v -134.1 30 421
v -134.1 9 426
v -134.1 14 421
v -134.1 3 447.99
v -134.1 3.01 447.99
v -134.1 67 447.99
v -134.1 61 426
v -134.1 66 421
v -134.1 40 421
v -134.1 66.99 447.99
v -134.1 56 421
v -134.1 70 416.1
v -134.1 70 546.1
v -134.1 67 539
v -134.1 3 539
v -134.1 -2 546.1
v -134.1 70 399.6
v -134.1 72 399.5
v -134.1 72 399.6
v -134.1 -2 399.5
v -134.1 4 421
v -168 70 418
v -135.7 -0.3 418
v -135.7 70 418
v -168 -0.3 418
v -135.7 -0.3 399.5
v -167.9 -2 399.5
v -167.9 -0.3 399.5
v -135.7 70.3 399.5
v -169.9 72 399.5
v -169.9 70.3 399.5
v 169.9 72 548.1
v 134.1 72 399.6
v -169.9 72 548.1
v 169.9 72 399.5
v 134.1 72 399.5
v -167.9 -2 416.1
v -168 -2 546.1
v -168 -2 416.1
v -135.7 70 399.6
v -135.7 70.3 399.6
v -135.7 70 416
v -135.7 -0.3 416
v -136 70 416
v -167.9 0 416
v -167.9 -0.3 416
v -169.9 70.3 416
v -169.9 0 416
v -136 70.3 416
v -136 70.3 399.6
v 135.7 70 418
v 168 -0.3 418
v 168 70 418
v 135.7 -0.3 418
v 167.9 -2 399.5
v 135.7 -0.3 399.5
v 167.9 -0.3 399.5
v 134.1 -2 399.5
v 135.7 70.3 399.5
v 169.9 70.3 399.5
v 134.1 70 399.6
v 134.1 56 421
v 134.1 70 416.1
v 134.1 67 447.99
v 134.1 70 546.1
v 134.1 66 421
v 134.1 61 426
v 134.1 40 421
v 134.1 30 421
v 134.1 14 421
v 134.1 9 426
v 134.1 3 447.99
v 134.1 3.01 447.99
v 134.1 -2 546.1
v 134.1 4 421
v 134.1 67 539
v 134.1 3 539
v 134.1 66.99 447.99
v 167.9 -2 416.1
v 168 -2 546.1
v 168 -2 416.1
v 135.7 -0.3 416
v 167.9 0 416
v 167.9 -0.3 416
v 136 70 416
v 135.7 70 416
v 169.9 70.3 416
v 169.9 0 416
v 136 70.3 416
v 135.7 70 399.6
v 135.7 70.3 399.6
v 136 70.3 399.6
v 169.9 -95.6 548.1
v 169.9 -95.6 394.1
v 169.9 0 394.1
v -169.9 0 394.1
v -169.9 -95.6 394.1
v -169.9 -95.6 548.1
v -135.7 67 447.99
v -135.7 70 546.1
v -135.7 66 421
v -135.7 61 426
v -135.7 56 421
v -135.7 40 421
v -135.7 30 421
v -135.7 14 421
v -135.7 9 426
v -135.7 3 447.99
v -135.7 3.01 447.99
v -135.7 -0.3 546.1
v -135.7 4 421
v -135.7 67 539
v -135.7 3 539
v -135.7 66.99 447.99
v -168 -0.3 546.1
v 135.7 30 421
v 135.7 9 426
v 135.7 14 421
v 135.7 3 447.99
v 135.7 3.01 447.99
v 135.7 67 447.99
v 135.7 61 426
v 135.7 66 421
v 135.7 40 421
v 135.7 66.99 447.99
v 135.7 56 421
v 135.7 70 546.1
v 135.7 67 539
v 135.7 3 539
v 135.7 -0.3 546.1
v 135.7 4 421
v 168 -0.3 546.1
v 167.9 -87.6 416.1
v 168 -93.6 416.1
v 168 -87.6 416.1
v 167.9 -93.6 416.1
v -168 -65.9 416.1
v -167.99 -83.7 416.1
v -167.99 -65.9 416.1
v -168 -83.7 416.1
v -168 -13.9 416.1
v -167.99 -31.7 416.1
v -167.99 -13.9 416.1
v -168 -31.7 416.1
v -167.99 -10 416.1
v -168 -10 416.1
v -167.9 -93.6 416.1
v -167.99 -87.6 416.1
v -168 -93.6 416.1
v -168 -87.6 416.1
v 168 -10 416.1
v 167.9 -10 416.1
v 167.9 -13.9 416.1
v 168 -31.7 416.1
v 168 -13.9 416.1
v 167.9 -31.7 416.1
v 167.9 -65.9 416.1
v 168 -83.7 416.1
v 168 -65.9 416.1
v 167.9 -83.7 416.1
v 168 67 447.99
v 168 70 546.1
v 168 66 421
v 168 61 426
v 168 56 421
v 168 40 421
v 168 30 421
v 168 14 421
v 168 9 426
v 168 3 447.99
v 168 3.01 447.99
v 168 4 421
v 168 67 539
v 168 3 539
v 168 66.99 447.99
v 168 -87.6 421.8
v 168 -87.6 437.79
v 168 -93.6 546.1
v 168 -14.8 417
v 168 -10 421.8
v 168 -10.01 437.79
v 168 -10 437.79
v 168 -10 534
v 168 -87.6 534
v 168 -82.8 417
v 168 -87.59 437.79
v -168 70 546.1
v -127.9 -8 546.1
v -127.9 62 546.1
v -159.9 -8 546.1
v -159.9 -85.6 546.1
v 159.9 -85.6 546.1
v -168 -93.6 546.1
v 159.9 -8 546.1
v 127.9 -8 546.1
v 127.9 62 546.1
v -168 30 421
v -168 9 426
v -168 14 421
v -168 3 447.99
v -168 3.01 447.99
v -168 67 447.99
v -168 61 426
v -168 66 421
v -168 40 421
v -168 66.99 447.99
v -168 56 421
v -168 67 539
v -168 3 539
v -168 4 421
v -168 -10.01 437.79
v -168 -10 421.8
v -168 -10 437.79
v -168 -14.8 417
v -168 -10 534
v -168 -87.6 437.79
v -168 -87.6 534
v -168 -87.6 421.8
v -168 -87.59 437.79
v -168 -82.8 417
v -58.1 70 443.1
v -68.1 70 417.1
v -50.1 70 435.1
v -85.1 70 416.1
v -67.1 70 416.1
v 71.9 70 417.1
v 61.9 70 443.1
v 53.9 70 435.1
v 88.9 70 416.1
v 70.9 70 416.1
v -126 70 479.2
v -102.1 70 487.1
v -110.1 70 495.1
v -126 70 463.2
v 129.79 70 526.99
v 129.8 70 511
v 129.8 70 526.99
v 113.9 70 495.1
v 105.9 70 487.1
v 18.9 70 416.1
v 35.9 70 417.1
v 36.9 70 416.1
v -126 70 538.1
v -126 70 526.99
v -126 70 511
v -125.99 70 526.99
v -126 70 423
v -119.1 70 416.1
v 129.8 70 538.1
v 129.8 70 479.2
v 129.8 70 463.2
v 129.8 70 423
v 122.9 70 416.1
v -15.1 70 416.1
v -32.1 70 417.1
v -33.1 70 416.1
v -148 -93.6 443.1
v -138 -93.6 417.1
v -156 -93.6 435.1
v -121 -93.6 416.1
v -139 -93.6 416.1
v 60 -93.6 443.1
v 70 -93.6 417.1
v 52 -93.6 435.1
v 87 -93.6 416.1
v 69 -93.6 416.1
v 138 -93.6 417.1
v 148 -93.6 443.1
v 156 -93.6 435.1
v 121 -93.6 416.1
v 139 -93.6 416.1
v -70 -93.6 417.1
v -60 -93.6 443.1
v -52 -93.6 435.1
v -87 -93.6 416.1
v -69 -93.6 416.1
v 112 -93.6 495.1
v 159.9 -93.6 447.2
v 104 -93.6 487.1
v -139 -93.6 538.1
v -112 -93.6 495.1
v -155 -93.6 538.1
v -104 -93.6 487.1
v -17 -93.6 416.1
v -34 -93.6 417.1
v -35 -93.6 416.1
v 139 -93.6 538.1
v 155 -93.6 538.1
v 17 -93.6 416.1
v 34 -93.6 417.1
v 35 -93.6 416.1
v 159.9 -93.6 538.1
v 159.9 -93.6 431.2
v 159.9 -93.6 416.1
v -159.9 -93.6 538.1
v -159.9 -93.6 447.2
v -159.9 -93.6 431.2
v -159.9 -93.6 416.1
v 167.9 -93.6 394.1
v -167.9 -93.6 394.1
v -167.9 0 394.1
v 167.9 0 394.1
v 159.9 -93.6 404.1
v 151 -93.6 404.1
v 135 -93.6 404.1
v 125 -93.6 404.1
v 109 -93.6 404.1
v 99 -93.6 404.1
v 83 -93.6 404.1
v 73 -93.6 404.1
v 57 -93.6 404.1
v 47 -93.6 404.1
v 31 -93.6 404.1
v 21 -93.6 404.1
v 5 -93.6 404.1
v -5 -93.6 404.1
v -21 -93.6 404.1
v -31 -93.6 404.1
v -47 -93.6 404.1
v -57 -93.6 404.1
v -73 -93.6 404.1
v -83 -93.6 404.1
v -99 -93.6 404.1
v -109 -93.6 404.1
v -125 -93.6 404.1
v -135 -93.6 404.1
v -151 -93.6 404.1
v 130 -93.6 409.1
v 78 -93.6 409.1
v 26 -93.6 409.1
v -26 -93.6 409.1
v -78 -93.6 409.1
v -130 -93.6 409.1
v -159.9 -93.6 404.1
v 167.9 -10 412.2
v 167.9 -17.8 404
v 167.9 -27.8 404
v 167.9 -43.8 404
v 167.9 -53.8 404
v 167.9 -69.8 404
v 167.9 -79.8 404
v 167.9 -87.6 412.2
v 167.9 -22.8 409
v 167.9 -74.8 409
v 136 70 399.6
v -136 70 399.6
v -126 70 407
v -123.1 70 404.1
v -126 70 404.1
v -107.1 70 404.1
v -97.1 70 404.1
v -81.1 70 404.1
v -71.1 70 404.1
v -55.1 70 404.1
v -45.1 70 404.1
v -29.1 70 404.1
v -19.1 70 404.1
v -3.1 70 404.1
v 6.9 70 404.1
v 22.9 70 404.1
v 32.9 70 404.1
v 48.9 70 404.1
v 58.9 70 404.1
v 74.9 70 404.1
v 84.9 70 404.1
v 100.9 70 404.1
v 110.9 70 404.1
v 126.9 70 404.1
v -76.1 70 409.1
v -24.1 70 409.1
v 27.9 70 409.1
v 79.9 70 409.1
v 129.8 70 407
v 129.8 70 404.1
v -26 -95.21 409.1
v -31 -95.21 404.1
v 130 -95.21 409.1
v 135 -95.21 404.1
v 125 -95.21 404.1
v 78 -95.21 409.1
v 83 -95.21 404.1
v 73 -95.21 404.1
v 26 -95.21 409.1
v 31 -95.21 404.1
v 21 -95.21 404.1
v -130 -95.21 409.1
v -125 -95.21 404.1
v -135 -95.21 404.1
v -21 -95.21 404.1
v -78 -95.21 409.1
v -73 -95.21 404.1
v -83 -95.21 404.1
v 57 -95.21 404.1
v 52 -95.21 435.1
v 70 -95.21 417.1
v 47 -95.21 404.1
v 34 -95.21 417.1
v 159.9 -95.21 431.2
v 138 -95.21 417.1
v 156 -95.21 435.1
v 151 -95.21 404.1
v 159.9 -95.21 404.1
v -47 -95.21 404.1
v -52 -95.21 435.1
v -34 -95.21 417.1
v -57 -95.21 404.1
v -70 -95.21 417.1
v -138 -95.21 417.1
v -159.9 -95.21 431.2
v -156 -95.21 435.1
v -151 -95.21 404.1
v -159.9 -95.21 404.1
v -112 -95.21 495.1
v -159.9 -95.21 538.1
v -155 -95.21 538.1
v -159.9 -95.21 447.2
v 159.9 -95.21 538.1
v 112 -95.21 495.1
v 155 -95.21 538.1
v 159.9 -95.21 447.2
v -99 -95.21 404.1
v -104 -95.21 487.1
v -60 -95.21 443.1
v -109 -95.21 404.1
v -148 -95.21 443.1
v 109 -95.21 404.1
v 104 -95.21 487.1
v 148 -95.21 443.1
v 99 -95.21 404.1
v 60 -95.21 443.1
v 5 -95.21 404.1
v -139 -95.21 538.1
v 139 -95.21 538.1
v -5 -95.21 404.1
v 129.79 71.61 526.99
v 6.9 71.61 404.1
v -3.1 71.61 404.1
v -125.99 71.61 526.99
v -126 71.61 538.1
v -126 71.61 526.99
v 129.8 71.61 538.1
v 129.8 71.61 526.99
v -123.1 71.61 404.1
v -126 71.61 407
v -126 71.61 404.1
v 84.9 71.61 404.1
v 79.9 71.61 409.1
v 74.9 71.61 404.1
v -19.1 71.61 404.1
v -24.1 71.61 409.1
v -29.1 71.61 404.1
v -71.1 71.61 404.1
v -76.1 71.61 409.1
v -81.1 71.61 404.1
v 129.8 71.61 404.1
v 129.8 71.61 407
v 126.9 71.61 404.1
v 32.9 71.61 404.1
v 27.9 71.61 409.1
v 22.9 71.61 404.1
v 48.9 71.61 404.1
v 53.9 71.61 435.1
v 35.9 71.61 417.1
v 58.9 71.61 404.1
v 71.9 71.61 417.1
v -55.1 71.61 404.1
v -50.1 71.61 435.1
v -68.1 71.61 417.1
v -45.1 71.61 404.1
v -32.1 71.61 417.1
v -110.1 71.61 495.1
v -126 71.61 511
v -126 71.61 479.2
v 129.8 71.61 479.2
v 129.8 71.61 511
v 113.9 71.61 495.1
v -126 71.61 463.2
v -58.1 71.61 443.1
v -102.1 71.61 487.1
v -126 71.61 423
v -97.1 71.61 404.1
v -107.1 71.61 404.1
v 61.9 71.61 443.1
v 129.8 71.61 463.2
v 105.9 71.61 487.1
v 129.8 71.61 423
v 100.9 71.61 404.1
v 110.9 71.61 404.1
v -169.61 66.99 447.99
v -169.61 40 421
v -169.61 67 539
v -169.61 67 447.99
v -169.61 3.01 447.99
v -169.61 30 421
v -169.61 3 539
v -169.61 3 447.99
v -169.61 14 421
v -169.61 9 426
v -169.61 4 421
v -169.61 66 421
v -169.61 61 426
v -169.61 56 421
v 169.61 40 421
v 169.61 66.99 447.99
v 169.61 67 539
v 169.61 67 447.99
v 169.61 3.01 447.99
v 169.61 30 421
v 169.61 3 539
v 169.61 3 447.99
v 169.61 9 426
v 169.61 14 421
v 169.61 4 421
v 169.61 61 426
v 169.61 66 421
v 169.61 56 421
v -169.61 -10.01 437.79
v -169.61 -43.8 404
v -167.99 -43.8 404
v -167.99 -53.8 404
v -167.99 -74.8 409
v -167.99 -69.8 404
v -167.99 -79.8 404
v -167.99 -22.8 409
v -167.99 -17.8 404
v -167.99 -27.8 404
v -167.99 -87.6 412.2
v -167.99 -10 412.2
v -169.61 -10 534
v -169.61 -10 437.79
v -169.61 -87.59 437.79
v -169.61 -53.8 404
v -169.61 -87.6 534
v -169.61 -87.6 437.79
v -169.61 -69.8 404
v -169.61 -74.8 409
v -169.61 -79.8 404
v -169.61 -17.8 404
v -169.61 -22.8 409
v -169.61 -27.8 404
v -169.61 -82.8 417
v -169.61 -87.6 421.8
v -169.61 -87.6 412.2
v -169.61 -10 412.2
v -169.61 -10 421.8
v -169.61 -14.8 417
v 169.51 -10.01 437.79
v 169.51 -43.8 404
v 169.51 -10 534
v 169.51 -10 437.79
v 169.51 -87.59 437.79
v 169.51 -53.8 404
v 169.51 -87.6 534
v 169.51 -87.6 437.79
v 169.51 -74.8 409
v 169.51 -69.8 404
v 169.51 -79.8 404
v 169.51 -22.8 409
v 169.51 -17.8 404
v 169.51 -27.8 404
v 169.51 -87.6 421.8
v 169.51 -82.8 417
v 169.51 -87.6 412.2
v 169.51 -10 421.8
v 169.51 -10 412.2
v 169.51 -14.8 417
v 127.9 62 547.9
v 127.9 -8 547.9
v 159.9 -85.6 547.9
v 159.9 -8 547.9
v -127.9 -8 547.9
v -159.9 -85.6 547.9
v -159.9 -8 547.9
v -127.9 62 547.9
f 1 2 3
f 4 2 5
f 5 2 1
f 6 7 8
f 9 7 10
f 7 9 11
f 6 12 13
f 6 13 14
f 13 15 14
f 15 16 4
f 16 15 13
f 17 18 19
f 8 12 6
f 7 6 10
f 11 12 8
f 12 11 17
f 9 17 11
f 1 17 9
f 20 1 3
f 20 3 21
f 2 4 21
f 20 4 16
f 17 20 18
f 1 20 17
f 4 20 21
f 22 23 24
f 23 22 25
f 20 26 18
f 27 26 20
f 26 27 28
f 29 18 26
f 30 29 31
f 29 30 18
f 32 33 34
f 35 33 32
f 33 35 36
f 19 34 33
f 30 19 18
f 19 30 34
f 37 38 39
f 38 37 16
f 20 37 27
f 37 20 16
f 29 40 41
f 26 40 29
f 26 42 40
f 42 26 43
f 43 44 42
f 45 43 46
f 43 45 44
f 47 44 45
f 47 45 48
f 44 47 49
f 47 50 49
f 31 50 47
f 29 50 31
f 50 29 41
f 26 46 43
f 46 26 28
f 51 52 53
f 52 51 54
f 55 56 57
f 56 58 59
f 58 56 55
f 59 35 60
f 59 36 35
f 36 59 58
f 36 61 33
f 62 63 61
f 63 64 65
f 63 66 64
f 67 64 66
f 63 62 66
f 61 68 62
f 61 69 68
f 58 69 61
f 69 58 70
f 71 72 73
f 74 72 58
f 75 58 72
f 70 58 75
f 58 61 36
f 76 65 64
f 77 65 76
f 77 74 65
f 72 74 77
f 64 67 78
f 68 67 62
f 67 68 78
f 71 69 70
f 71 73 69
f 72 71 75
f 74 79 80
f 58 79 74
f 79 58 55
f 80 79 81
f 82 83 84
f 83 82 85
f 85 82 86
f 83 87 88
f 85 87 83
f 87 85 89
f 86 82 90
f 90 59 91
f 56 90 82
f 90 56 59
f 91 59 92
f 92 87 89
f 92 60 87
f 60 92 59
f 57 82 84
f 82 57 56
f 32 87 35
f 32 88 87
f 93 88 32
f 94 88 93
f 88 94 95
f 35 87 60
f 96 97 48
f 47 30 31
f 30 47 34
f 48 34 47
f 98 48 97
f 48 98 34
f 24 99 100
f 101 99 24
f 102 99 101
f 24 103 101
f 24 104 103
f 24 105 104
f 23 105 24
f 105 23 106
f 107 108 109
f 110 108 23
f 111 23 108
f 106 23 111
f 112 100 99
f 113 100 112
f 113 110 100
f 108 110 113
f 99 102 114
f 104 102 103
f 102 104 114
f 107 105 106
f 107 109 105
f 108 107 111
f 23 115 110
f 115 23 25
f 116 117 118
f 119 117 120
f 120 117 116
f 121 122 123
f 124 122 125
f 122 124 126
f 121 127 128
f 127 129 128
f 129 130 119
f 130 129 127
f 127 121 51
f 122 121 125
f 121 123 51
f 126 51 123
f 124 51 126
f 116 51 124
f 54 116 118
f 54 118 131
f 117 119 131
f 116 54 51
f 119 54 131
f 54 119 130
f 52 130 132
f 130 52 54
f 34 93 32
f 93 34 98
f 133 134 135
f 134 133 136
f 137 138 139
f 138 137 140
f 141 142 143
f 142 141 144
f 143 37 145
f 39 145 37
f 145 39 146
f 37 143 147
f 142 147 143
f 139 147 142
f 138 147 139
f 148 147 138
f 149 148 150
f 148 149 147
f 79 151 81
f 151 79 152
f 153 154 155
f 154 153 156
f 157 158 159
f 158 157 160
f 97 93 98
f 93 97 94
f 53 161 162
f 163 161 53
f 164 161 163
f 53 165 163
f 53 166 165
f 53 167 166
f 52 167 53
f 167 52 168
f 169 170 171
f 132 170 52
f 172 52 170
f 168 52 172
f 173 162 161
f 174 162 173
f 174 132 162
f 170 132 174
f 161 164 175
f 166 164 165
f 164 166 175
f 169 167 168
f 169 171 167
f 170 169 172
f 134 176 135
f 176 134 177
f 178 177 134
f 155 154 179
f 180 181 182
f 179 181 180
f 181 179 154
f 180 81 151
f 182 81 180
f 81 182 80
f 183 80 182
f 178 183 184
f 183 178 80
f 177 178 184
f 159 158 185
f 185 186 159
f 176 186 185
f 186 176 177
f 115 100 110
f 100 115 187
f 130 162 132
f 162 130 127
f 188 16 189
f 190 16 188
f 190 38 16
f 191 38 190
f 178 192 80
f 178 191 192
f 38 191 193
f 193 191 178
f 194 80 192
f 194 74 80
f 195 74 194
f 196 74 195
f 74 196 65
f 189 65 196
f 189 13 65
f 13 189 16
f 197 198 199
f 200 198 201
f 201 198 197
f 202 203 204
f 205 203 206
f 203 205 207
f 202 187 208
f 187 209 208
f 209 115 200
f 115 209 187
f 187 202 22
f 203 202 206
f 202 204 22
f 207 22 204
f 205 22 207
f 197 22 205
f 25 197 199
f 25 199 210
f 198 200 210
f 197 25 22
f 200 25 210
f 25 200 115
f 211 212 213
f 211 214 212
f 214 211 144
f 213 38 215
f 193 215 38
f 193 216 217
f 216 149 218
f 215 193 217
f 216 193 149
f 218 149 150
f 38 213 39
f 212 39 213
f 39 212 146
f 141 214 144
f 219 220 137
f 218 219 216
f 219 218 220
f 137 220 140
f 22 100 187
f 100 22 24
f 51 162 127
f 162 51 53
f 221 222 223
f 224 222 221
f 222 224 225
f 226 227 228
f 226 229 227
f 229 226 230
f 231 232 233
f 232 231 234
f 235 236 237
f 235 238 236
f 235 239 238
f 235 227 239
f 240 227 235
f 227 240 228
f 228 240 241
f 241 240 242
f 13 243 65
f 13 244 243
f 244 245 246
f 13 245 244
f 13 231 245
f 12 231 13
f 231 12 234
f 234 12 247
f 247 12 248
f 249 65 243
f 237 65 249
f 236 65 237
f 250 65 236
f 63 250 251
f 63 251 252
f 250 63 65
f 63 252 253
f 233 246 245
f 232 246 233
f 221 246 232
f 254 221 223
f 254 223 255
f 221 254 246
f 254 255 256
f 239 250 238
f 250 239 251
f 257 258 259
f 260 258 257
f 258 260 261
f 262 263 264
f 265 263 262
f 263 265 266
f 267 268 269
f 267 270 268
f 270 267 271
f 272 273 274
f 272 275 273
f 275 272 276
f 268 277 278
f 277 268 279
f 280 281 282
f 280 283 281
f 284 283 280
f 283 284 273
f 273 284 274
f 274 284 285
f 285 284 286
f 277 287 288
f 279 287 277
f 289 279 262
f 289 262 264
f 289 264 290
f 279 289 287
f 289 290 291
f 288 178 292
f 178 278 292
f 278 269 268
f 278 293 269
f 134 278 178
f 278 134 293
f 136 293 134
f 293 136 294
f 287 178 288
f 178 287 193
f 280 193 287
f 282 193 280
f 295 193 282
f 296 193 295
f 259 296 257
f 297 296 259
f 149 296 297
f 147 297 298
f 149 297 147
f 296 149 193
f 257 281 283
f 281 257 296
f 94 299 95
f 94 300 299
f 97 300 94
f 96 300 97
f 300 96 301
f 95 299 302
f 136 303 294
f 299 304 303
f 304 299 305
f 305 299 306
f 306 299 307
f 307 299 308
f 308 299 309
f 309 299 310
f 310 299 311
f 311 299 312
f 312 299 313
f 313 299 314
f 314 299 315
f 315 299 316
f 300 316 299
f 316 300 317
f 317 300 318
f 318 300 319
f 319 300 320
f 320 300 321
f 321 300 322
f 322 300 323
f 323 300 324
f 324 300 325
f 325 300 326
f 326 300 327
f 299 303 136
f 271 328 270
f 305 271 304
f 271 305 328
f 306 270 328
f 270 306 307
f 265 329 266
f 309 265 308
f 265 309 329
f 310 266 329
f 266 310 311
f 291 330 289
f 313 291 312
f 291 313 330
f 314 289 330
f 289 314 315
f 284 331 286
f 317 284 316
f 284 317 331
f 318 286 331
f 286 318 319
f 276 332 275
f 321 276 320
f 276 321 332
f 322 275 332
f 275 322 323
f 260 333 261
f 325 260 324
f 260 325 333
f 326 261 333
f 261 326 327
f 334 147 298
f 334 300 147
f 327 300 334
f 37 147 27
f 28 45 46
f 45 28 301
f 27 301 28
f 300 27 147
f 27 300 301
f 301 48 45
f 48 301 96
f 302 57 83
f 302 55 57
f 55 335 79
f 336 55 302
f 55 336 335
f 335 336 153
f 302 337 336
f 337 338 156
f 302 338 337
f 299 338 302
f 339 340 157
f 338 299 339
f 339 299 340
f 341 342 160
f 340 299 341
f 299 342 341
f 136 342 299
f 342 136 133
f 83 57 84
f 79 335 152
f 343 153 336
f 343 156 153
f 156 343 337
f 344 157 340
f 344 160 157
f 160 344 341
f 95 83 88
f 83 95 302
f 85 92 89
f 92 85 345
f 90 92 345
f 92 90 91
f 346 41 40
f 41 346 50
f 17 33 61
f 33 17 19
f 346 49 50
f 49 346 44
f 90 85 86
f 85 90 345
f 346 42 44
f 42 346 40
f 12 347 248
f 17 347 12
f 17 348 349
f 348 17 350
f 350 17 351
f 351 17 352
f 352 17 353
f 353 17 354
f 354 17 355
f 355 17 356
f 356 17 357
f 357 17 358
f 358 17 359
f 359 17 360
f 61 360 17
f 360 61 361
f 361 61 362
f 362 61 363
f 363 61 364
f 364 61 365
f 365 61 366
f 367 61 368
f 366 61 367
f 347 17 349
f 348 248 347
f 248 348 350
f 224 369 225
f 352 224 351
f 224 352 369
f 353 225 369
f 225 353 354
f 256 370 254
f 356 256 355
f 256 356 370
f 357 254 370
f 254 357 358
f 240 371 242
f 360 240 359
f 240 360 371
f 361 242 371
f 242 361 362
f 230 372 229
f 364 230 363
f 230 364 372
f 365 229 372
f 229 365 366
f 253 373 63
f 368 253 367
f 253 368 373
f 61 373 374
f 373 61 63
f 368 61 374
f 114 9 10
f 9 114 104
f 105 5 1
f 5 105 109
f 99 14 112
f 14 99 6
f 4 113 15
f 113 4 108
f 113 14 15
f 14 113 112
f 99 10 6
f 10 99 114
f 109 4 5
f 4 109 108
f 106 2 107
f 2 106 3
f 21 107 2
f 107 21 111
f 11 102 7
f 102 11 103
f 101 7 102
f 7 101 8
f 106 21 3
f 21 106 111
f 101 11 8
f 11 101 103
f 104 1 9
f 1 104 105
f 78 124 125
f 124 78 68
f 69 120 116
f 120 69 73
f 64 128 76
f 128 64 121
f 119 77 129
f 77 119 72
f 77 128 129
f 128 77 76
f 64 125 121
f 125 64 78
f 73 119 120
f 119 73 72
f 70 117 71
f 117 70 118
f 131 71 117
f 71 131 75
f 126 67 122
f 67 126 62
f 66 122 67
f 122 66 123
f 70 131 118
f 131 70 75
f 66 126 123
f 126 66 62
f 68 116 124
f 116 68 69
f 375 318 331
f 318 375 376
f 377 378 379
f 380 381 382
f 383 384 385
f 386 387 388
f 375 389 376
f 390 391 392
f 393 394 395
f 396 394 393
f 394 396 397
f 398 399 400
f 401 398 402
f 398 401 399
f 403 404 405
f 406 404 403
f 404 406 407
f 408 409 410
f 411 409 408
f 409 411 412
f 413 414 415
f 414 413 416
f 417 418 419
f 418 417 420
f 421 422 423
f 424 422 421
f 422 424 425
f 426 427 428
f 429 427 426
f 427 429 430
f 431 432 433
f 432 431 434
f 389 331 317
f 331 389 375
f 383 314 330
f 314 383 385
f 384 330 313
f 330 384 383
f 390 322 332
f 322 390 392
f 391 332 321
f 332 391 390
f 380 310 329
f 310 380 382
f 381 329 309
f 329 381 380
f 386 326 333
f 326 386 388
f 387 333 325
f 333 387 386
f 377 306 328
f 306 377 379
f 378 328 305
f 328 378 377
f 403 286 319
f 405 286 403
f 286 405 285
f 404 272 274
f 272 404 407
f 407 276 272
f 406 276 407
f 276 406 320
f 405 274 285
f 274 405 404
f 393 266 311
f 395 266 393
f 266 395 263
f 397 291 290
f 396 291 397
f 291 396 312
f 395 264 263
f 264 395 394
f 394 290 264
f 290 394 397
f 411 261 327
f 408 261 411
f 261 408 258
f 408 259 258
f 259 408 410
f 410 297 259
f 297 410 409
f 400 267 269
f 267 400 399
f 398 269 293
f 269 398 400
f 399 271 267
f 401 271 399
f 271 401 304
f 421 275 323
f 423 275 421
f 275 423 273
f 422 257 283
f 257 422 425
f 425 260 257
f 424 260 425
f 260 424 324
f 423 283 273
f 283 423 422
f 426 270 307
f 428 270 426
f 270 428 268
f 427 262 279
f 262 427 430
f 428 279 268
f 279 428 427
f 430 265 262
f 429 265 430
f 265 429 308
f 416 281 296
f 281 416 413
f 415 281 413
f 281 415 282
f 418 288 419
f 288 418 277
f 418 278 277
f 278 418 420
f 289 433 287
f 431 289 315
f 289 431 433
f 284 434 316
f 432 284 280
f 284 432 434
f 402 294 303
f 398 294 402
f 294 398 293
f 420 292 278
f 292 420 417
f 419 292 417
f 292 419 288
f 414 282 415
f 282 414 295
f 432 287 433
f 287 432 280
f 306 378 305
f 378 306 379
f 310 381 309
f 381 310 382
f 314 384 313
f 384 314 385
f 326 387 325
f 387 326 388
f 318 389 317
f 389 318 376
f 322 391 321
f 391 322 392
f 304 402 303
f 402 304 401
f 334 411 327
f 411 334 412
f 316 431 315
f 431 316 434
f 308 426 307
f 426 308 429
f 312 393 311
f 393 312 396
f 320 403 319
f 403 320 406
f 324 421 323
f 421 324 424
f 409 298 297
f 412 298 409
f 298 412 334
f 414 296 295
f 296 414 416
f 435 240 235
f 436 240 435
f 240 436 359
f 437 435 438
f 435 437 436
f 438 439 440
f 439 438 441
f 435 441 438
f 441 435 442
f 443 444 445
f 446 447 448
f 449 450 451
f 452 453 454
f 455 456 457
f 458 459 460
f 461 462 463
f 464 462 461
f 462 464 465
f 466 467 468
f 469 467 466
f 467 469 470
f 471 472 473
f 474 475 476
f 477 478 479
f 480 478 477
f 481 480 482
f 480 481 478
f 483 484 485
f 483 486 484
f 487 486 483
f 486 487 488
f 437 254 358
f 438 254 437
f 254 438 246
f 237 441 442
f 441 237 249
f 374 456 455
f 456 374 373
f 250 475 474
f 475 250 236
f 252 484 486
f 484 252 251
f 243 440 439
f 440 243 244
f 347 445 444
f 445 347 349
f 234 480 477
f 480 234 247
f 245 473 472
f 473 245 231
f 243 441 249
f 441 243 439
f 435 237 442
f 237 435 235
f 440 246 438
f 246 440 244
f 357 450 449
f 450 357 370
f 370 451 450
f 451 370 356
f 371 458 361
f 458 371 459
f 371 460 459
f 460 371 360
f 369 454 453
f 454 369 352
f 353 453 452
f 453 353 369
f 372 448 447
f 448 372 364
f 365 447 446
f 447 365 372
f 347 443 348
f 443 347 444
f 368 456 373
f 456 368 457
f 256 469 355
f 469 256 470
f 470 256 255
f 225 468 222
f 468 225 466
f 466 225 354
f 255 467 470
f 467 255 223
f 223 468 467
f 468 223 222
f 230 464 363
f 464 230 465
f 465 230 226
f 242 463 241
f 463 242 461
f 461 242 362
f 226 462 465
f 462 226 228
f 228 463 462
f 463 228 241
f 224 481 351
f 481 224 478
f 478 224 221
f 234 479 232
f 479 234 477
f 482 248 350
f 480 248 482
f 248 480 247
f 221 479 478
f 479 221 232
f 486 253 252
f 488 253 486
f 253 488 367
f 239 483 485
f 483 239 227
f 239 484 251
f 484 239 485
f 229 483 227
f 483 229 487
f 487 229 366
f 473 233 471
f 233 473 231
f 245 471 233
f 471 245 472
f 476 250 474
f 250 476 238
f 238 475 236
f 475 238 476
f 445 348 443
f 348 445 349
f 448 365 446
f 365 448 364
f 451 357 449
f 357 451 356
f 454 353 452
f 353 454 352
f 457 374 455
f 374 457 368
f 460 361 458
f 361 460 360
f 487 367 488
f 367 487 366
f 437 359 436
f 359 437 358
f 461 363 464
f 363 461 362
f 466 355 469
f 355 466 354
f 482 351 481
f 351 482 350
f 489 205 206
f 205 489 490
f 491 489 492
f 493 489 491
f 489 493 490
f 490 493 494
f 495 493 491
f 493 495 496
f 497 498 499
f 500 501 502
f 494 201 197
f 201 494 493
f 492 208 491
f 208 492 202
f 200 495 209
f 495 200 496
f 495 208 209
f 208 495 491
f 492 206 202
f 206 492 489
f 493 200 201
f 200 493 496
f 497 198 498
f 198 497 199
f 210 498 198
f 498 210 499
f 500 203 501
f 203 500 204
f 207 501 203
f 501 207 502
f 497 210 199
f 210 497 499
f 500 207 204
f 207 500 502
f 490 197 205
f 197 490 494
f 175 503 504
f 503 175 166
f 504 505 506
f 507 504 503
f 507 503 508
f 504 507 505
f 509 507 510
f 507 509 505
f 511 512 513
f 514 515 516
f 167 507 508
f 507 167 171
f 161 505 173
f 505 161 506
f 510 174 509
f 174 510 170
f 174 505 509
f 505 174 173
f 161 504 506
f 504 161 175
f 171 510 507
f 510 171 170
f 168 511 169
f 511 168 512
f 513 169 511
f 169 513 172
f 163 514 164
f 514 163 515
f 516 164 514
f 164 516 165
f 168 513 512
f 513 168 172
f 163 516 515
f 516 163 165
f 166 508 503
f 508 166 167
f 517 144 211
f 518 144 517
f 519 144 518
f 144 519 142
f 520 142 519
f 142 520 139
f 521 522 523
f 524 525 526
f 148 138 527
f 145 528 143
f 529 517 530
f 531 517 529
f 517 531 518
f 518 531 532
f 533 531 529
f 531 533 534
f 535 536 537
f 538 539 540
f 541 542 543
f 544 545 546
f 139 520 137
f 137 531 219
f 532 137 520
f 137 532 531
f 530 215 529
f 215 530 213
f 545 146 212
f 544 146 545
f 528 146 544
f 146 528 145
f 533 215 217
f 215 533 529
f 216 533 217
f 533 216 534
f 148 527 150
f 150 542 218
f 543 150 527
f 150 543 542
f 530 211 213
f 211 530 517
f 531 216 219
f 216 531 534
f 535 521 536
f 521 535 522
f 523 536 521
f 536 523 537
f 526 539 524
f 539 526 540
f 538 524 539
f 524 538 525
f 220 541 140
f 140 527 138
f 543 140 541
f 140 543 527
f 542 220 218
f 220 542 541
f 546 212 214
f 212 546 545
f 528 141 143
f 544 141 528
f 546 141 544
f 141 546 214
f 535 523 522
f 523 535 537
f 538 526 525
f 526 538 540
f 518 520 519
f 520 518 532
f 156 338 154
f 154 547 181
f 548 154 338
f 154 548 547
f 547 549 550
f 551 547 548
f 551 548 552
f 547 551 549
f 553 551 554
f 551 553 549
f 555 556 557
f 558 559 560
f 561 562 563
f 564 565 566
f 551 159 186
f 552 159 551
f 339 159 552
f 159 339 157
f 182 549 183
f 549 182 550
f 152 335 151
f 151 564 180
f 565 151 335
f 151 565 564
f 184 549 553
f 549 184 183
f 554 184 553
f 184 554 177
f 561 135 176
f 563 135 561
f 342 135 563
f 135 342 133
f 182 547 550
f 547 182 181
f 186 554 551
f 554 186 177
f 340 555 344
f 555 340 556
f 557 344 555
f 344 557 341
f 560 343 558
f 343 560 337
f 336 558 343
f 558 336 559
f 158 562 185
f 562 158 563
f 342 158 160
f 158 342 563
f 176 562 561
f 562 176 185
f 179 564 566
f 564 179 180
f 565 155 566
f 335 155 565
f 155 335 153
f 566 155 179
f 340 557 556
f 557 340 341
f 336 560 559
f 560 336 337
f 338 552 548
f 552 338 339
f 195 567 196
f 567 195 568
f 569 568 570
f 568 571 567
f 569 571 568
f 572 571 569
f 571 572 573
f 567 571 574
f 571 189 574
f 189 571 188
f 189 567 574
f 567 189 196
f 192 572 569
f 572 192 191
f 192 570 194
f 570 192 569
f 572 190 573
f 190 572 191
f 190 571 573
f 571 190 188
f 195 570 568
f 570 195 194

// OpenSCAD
// Copyright 2024 Heikki Suonsivu
// Licensed under Creative Commons CC-BY-NC-SA, see https://creativecommons.org/licenses/by-nc-sa/4.0/
// For commercial licensing, please contact directly, hsu-3d@suonsivu.net, +358 40 551 9679

// todo
// fingerclip
// 

include <hsu.scad>

print=1;

lightenthin=1; // Make various areas very thin to reduce printing time and material consumption.
lightenx=lightenthin?0.4:0;
lighteny=lightenthin?0.4:0;
lightenz=lightenthin?0.2:0;

lmargin=10;
lfill=8;

maxbridge=10;

b=800;

xtolerance=0.3;
ytolerance=0.3;
ztolerance=0.3;

maxy=240; // 250 really, but leave some space
wall=1.2; // Just wall to block airflow, no strength
mediumwall=2.0; // Thicker wall when structural strength may be needed

baseh=58; // Under z=0
baseheight=-baseh;
basew=426;
basel=434;
basey=-273;

towerh=416;//410;
towerw=64;
towerl=70;
towerdistance=272;
towerfreecap=16.5;
towerfreespaceabove=130;

maxh=394; // Only towers are higher than this
maxtotower=towerh-maxh;

topbarh=25.5;
topbarheight=towerh-18.8-topbarh; // measured 395 should be
echo(topbarheight);

topbarl=18.1; //19;
topbarfromtowerback=5.5;
topbary=towerl-topbarfromtowerback-topbarl;

topcoverh=150;
topcoverfrontl=160; // From back of towers
topcoverbackl=130; // From back of towers
topcoverfronty=towerl-topcoverfrontl;
topcoverbacky=towerl+topcoverbackl;
topcoverw=towerdistance+towerw;

backw=towerdistance+wall*2+2*9; // TARKISTA CORNER
backl=195-towerl;//190-towerl;
backbottomextension=15;
backmidflangew=2*mediumwall;
backmidflangel=8;
backflangew=5;
backflangel=wall;
backcornerfill=5;
backoverbase=towerl+backl-(basey+basel)+ytolerance-36;

spoolholderh=40;
spoolholderw=40;
spoolholderlength=244;
spoolholderl=8.3;
spoolholderheight=329;
spoolholderx=-towerdistance/2-towerw/2-spoolholderl/2+spoolholderw/2-spoolholderlength;

trayh=3.5;
lefttrayedgeh=45;
righttrayedgeh=25;

gantrymovement=305-55; // 333-85; //300; //250; // TARKISTA

//45 65
leftboxw=72;
leftboxl=65;
leftboxh=132;
leftboxx=-38-leftboxw-towerdistance/2; // TARKISTA
leftboxy=-49;//-leftboxl;

leftboxbottomheight=12;
leftboxtopheight=leftboxbottomheight+gantrymovement; // Including left box h

filamenty=42;
filamentd=10;
filamentw=1;
filamenttubed=4;
filamenttubew=10;
filamentheight=105;

rightboxw=81.5;//74;
rightboxl=94; // y size
rightboxh=128;
rightboxx=towerdistance/2+39;

cameray=14; // camera position y size (from back)
cameraw=10;
cameral=36;
camerah=45;
cameraheight=0; // TARKISTA relative to bottom of right box

rightboxbottomheight=12;
rightboxtopheight=rightboxbottomheight+gantrymovement;

rightboxy=-74;

printplateheight=25;
printplateh=5;
printplatew=250;
magnetplatetabl=17;
magnetplatetabw=153;
printplatel=250;
printplatefronty=-332+magnetplatetabl; // Print plate when in front position
printplatebacky=190-printplatel; // Print plate when in back position

gantryw=360;
gantryl=18.5;
gantryh=28.1;
gantrybottomheight=84.6-gantryh;
gantryy=-20.6;
gantrytopheight=gantrybottomheight+gantrymovement;

printheadw=97.5;
printheadl=65;
printheadh=101.5; // Including nozzle
printheadleftx=-35.5-towerdistance/2; // TARKISTA
printheadrightx=towerdistance/2-70.8;
printheady=gantryy-printheadl;
printheadbottomheight=printplateheight+printplateh;
printheadtopheight=printheadbottomheight+gantrymovement;

midcovery=printheady-10;

midcoverx=leftboxx-2;
midcoverrightx=towerdistance/2+towerw;
midcoverrightw=rightboxx+rightboxw+2-midcoverrightx;

frontw=300;
fronty=printplatefronty-magnetplatetabl-3;
fronth=printplateheight+printplateh+250;
frontflange=5;
frontunderflange=(frontw-printplatew)/2;

module leftbox() {
  cube([leftboxw,leftboxl,leftboxh]);
  translate([-filamentw,filamenty,filamentheight]) rotate([0,90,0]) cylinder(d=filamentd,h=filamentw);
  translate([0.01,filamenty,filamentheight]) rotate([0,-90,0]) cylinder(d=filamenttubed,h=filamenttubew+0.01);
}

module ankermakem5() {
  if (0) {
    translate([-basew/2,basey,baseheight]) cube([basew,basel,baseh]);

    translate([-towerdistance/2,topbary,topbarheight]) cube([towerdistance,topbarl,topbarh]);

    translate([spoolholderx,towerl,spoolholderheight]) cube([spoolholderlength,spoolholderl,spoolholderh]);
  
    translate([-towerw-towerdistance/2,0,0]) cube([towerw,towerl,towerh]);
    translate([towerdistance/2,0,0]) cube([towerw,towerl,towerh]);

    translate([-printplatew/2,printplatefronty,printplateheight]) cube([printplatew,printplatel,printplateh]);
    translate([-magnetplatetabw/2,printplatefronty-magnetplatetabl,printplateheight]) cube([magnetplatetabw,magnetplatetabl,printplateh]);

    translate([leftboxx,leftboxy,leftboxbottomheight]) leftbox();
  
    translate([rightboxx,rightboxy,rightboxbottomheight]) cube([rightboxw,rightboxl,rightboxh]);
    translate([rightboxx-cameraw,rightboxy+cameray,rightboxbottomheight+cameraheight]) cube([cameraw,cameral,camerah]);

    translate([-gantryw/2,gantryy,gantrybottomheight]) cube([gantryw,gantryl,gantryh]);

    translate([printheadleftx,printheady,printheadbottomheight]) cube([printheadw,printheadl,printheadh]);
  
    color("yellow") {
      translate([-printplatew/2,printplatebacky,printplateheight]) cube([printplatew,printplatel,printplateh]);
      translate([-magnetplatetabw/2,printplatebacky-magnetplatetabl,printplateheight]) cube([magnetplatetabw,magnetplatetabl,printplateh]);
  
      translate([leftboxx,leftboxy,leftboxtopheight]) leftbox();

      translate([rightboxx,rightboxy,rightboxtopheight]) cube([rightboxw,rightboxl,rightboxh]);
      translate([rightboxx-cameraw,rightboxy+cameray,rightboxtopheight+cameraheight]) cube([cameraw,cameral,camerah]);

      translate([-gantryw/2,gantryy,gantrytopheight]) cube([gantryw,gantryl,gantryh]);

      translate([printheadrightx,printheady,printheadbottomheight]) cube([printheadw,printheadl,printheadh]);
      translate([printheadleftx,printheady,printheadtopheight]) cube([printheadw,printheadl,printheadh]);
      translate([printheadrightx,printheady,printheadtopheight]) cube([printheadw,printheadl,printheadh]);
    }
  } else {
    translate([0.5,-62.5,-49.47]) import("M5-Printer.stl", convexity=3);
  }
}

module backcover() {
  // top bar
  translate([-towerdistance/2+xtolerance,topbary-mediumwall,topbarheight]) cube([towerdistance-xtolerance*2,mediumwall,topbarh+mediumwall]);
  translate([-towerdistance/2+xtolerance,topbary-mediumwall,topbarheight+topbarh]) cube([towerdistance-xtolerance*2,topbarl+mediumwall+topbarfromtowerback+mediumwall,mediumwall]);
  translate([-towerdistance/2+xtolerance,topbary+topbarl,topbarheight]) cube([towerdistance-xtolerance*2,mediumwall,topbarh+mediumwall]);

  for (x=[-towerdistance/2+xtolerance,towerdistance/2-xtolerance-mediumwall]) {
    translate([x,topbary+topbarl,topbarheight]) cube([mediumwall,topbarfromtowerback+ytolerance+mediumwall,topbarh+wall]);
  }
  
  for (x=[-backw/2-xtolerance,towerdistance/2-xtolerance-mediumwall]) {
    translate([x,topbary+topbarl+topbarfromtowerback+ytolerance,topbarheight]) cube([(backw-towerdistance)/2+mediumwall+xtolerance*2,mediumwall,topbarh+wall]);
  }
  
  translate([-backw/2-xtolerance-backflangew,topbary+topbarl+topbarfromtowerback+ytolerance,backbottomextension]) cube([backflangew,mediumwall,spoolholderheight-spoolholderh/2-backbottomextension]);
  translate([backw/2,topbary+topbarl+topbarfromtowerback+ytolerance,backbottomextension]) cube([backflangew,mediumwall,topbarheight+topbarh+mediumwall-backbottomextension]);    

  difference() {
    translate([-backw/2-wall/2,topbary+topbarl+topbarfromtowerback+ytolerance,topbarheight+topbarh+mediumwall-wall]) cube([backw+wall,backl+wall-ytolerance,wall]);
    translate([-backw/2-wall/2+lmargin,topbary+topbarl+topbarfromtowerback+ytolerance+lmargin,topbarheight+topbarh+mediumwall-wall-0.01]) cube([backw+wall-lmargin*2,backl+wall-ytolerance-lmargin*2,wall-lightenz+0.01]);
  }

  for (x=[-backw/2-wall/2,backw/2-wall/2]) {
    difference() {
      hull() {
	translate([x,towerl+ytolerance,backbottomextension]) cube([wall,wall,wall]);
	translate([x,towerl+backl,printplateheight]) cube([wall,wall,wall]);
	translate([x,towerl+ytolerance,topbarheight+topbarh]) cube([wall,backl+wall-ytolerance,wall]);
      }

      translate([x+((x<0)?lightenx:0),towerl+ytolerance,printplateheight]) lighten(backl,topbarheight+topbarh-printplateheight,wall-lightenx,lmargin,lfill,maxbridge,"down-yplane");
    }
  }
  difference() {
    translate([-backw/2-wall/2,towerl+backl,printplateheight]) cube([backw,wall,topbarheight+topbarh+wall-printplateheight]);
    translate([-backw/2-wall/2,towerl+backl,printplateheight]) lighten(backw,topbarheight+topbarh+wall-printplateheight,wall-lighteny,lmargin,lfill,maxbridge,"down-xplane");
  }

  //for (x=[-backw/2-wall/2,backw/2-wall/2-backbottomextension]) {

  hull() {
    translate([-backw/2-wall/2,towerl+ytolerance,backbottomextension]) cube([wall,wall,mediumwall]);
    translate([-backw/2-wall/2+backbottomextension,towerl+ytolerance,0]) cube([wall,wall,mediumwall]);
    translate([-backw/2-wall/2+backbottomextension,basey+basel-ytolerance-backoverbase,0]) cube([wall,wall,mediumwall]);
  }
  hull() {
    translate([-backw/2-wall/2,towerl+ytolerance,backbottomextension]) cube([wall,wall,mediumwall]);
    translate([-backw/2-wall/2,towerl+backl,printplateheight]) cube([wall,wall,mediumwall]);
    translate([-backw/2-wall/2+backbottomextension,basey+basel-ytolerance-backoverbase,0]) cube([wall,wall,mediumwall]);
  }
  hull() {
    translate([-backw/2-wall/2,towerl+backl,printplateheight]) cube([wall,wall,mediumwall]);
    translate([-backw/2-wall/2+backbottomextension,basey+basel-ytolerance-backoverbase,0]) cube([wall,wall,mediumwall]);
    translate([backw/2-wall/2,towerl+backl,printplateheight]) cube([wall,wall,mediumwall]);
    translate([backw/2-wall/2-backbottomextension,basey+basel-ytolerance-backoverbase,0]) cube([wall,wall,mediumwall]);
  }
  hull() {
    translate([backw/2-wall/2,towerl+ytolerance,backbottomextension]) cube([wall,wall,mediumwall]);
    translate([backw/2-wall/2,towerl+backl,printplateheight]) cube([wall,wall,mediumwall]);
    translate([backw/2-wall/2-backbottomextension,basey+basel-ytolerance-backoverbase,0]) cube([wall,wall,mediumwall]);
  }
  hull() {
    translate([backw/2-wall/2,towerl+ytolerance,backbottomextension]) cube([wall,wall,mediumwall]);
    translate([backw/2-wall/2-backbottomextension,towerl+ytolerance,0]) cube([wall,wall,mediumwall]);
    translate([backw/2-wall/2-backbottomextension,basey+basel-ytolerance-backoverbase,0]) cube([wall,wall,mediumwall]);
  }
}

module leftcover() {
  difference() {
    union() {
      // Left cover
      translate([midcoverx,midcovery,0]) cube([-towerdistance/2-towerw-midcoverx,towerl/2-midcovery,mediumwall]);
      translate([midcoverx,midcovery,0]) cube([-frontw/2-midcoverx-xtolerance,-ytolerance-midcovery,mediumwall]);
      translate([midcoverx,midcovery,0]) cube([-towerdistance/2-towerw-midcoverx,mediumwall,maxh]);
      translate([midcoverx,towerl/2,0]) cube([-towerdistance/2-towerw-midcoverx,mediumwall,maxh+mediumwall]);

      difference() {
	union() {
	  translate([midcoverx,midcovery,0]) cube([wall,towerl/2-midcovery,maxh]);
	  hull() {
	    translate([midcoverx,leftboxy+filamenty,leftboxbottomheight+filamentheight]) rotate([0,90,0]) cylinder(h=mediumwall,d=filamentd+4+wall*2);
	    translate([midcoverx,leftboxy+filamenty,leftboxtopheight+filamentheight]) rotate([0,90,0]) cylinder(h=mediumwall,d=filamentd+4+wall*2);
	    translate([midcoverx,leftboxy+filamenty,leftboxbottomheight+filamentheight]) rotate([0,90,0]) cylinder(h=wall,d=filamentd+6+wall*2);
	    translate([midcoverx,leftboxy+filamenty,leftboxtopheight+filamentheight]) rotate([0,90,0]) cylinder(h=wall,d=filamentd+6+wall*2);
	  }
	}

	hull() {
	  translate([midcoverx-2,leftboxy+filamenty,leftboxbottomheight+filamentheight]) rotate([0,90,0]) cylinder(h=mediumwall+3,d=filamentd+4);
	  translate([midcoverx-2,leftboxy+filamenty,leftboxtopheight+filamentheight]) rotate([0,90,0]) cylinder(h=mediumwall+3,d=filamentd+4);
	}
      }
      translate([midcoverx,midcovery,maxh]) cube([-topcoverw/2-midcoverx-mediumwall,-midcovery,mediumwall]);
      translate([midcoverx,midcovery,maxh]) cube([-towerdistance/2-towerw-midcoverx-0.1,towerl/2-midcovery+mediumwall,mediumwall]);
      echo(-topcoverw/2,midcoverx/2,-midcoverx/2-topcoverw/2,topcoverw/2+midcoverx/2);

      // Mid plate front
      difference() {
	translate([-basew/2,midcovery,0]) cube([basew/2-xtolerance/2,mediumwall,maxh]);
	translate([-frontw/2-xtolerance,midcovery-0.1,-0.1]) cube([frontw+xtolerance*2,mediumwall+0.2,fronth+ztolerance+0.1]);
      }
    }
    
    translate([midcoverx+lightenz,midcovery,0]) lighten(-leftboxy+filamenty-filamentd,maxh,wall-lightenz,lmargin,lfill,maxbridge,"flat-xplane");
    translate([midcoverx,towerl/2,0]) lighten(maxh,-towerdistance/2-towerw-midcoverx,mediumwall-lighteny,lmargin,lfill,maxbridge,"right-xplane");
    translate([midcoverx,midcovery+lighteny,0]) lighten(fronth,-midcoverx-frontw/2,mediumwall,lmargin,lfill,maxbridge,"right-xplane");
#   translate([midcoverx,midcovery+lighteny,fronth]) lighten(maxh-fronth,-midcoverx,mediumwall-lighteny,lmargin,lfill,maxbridge,"right-xplane");
  }
}

module rightcover() {
  // Right cover
  difference() {
    union() {
      translate([midcoverrightx,midcovery,0]) cube([midcoverrightw,towerl/2-midcovery,mediumwall]);
      translate([frontw/2+xtolerance,midcovery,0]) cube([midcoverrightx+midcoverrightw-frontw/2+mediumwall-xtolerance,-ytolerance-midcovery,mediumwall]);
      translate([midcoverrightx,midcovery,0]) cube([midcoverrightw,mediumwall,maxh]);
      translate([midcoverrightx,towerl/2,0]) cube([midcoverrightw,mediumwall,maxh]);
      translate([midcoverrightx+midcoverrightw,midcovery,0]) cube([mediumwall,towerl/2-midcovery+mediumwall,maxh]);
      translate([midcoverrightx,midcovery,maxh]) cube([midcoverrightw+mediumwall,towerl/2-midcovery+mediumwall,mediumwall]);
      translate([midcoverrightx-towerw/2+mediumwall,midcovery,maxh]) cube([midcoverrightw+mediumwall,-midcovery,mediumwall]);

      // Mid plate front
      difference() {
	translate([xtolerance/2,midcovery,0]) cube([basew/2,mediumwall,maxh]);
	translate([-frontw/2-xtolerance,midcovery-0.1,-0.1]) cube([frontw+xtolerance*2,mediumwall+0.2,fronth+ztolerance+0.1]);
      }
    }

    translate([midcoverrightx+midcoverrightw,midcovery,0]) lighten(towerl/2-midcovery+mediumwall,maxh,mediumwall-lightenz,lmargin,lfill,maxbridge,"flat-xplane");
    translate([midcoverrightx,towerl/2,0]) lighten(maxh,midcoverrightw,mediumwall-lighteny,lmargin,lfill/2,maxbridge,"left-xplane");
    translate([frontw/2,midcovery+lighteny,0]) lighten(fronth,midcoverrightx+midcoverrightw-frontw/2,mediumwall,lmargin,lfill/2,maxbridge,"left-xplane");
    translate([0,midcovery+lighteny,fronth]) lighten(maxh-fronth,midcoverrightx+midcoverrightw,mediumwall-lighteny,lmargin,lfill/2,maxbridge,"left-xplane");
  }
}

module topcover() {
  difference() {
    // caps of towers
    union() {
      intersection() {
	union() {
	  for (x=[-towerdistance/2-towerw,towerdistance/2]) {
	    difference() {
	      translate([x-mediumwall+0.1,-mediumwall,towerh-towerfreecap])  cube([towerw+mediumwall*2-0.2,towerl+mediumwall*2,towerfreecap+mediumwall]);
	      translate([x-xtolerance,-ytolerance,towerh-towerfreecap-0.1])  cube([towerw+xtolerance*2,towerl+ytolerance*2,towerfreecap+0.1]);
	    }
	  }
	}

	// Cut out outer parts to tower tops
	translate([-topcoverw/2-mediumwall+0.1,midcovery,maxh+0.1]) cube([topcoverw+mediumwall*2-0.2,towerl-midcovery+mediumwall,towerfreecap+towerfreespaceabove+mediumwall]);
      }

      // support for caps of towers
      for (x=[-towerdistance/2-towerw/2,towerdistance/2]) {
	difference() {
	  translate([x-mediumwall+0.1,-mediumwall,towerh])  cube([towerw/2+mediumwall*2-0.2,towerl+mediumwall*2,towerfreespaceabove + mediumwall]);
	  translate([x-xtolerance,-ytolerance,towerh+mediumwall])  cube([towerw/2+xtolerance*2,towerl+ytolerance*2,towerfreespaceabove + mediumwall]);
	}
      }

      difference() {
	translate([-topcoverw/2-mediumwall+0.1,midcovery,towerh+0.1]) cube([topcoverw+mediumwall*2-0.2,towerl-midcovery+mediumwall,towerfreespaceabove+mediumwall]);

	translate([-topcoverw/2,midcovery+mediumwall,towerh]) cube([topcoverw,towerl-midcovery-mediumwall,towerfreespaceabove+0.1]);
      }
 
      translate([-topcoverw/2-mediumwall+0.1,midcovery,maxh+0.1]) cube([topcoverw+mediumwall*2-0.2,mediumwall,maxtotower]);
      translate([-topcoverw/2-mediumwall+0.1,midcovery,maxh+0.1]) cube([mediumwall,-midcovery,maxtotower]);
      translate([topcoverw/2-0.1,midcovery,maxh+0.1]) cube([mediumwall,-midcovery,maxtotower]);
      
      // Connecting plate between tower caps
      translate([-towerdistance/2,towerl,towerh-towerfreecap+0.1]) cube([towerdistance,mediumwall,towerfreecap]);
    }
    
    for (x=[-towerdistance/2-0.1,towerdistance/2-mediumwall]) {
      translate([x,-mediumwall,towerh]) lighten(towerl+mediumwall*2,towerfreespaceabove-mediumwall,mediumwall,lmargin/2,lfill,maxbridge,"down-yplane");
    }

    translate([-towerdistance/2-mediumwall+0.1+lmargin,midcovery+lmargin,towerh+0.1+towerfreespaceabove-0.01]) cube([towerdistance+mediumwall*2-0.2-lmargin*2,towerl-midcovery+mediumwall-lmargin*2,mediumwall-lightenz+0.01]);
    translate([-topcoverw/2-mediumwall+0.1+lmargin,midcovery+lmargin,towerh+0.1+towerfreespaceabove-0.01]) cube([topcoverw+mediumwall*2-0.2-lmargin*2,-midcovery+mediumwall-lmargin*2,mediumwall-lightenz+0.01]);
    translate([-topcoverw/2-mediumwall+0.1,midcovery+lighteny,maxh+0.1]) lighten(topcoverw+mediumwall*2-0.2,towerfreespaceabove+mediumwall+maxtotower,mediumwall-lighteny,lmargin,lfill,maxbridge,"down-xplane");
    translate([-towerdistance/2,midcovery+towerl-midcovery,maxh+0.1]) lighten(towerdistance+mediumwall*2-0.2,towerfreespaceabove+mediumwall+maxtotower,mediumwall-lighteny,lmargin,lfill,maxbridge,"down-xplane");

    for (x=[-towerdistance/2-towerw/2-0.1-mediumwall+lightenx+0.1,towerdistance/2+towerw/2]) {
      translate([x,-mediumwall,towerh]) lighten(towerl+mediumwall*2,towerfreespaceabove-mediumwall,mediumwall-lightenx,lmargin/2,lfill,maxbridge,"down-yplane");
    }
    
    for (x=[-towerdistance/2-towerw/2-0.1-mediumwall+lightenx+0.1,towerdistance/2+towerw/2-0.1]) {
      translate([x,midcovery-mediumwall,maxh]) lighten(-midcovery+mediumwall,maxtotower+towerfreespaceabove-mediumwall,mediumwall-lightenx,lmargin,lfill,maxbridge,"down-yplane");
    }
  }
}

module frontcover() {
  // Front cover
  difference() {
    translate([-frontw/2,fronty,0]) cube([frontw,mediumwall,fronth]);
    translate([-frontw/2+lmargin,fronty+lightenz,lmargin]) cube([frontw-lmargin*2,mediumwall-lightenz+0.01,fronth-lmargin*2]);
  }

  //Sides
  difference() {
    for (x=[-frontw/2,frontw/2-mediumwall]) {
      translate([x,fronty,0]) cube([mediumwall,midcovery-fronty+mediumwall*2,fronth]);
    }
  
    for (x=[-frontw/2+lightenx,frontw/2-mediumwall]) {
      translate([x,fronty,0]) lighten(midcovery-fronty+mediumwall*2,fronth,mediumwall-lightenx,lmargin,lfill,maxbridge,"back-yplane");
    }
  }
  
  translate([-frontw/2,fronty,0]) cube([frontw,basey-fronty+frontflange,mediumwall]);
  for (x=[-frontw/2,frontw/2-frontunderflange]) {
    translate([x,fronty,0]) cube([frontunderflange,midcovery-fronty+mediumwall*2,mediumwall]);
  }
  difference() {
    translate([-frontw/2,fronty,fronth-mediumwall]) cube([frontw,midcovery-fronty+mediumwall*2,mediumwall]);
    translate([-frontw/2,fronty,fronth-mediumwall]) lighten(midcovery-fronty+mediumwall*2,frontw,mediumwall-lightenx,lmargin,lfill,maxbridge,"back-zplane");
  }
  // Flange
  difference() {
    hull() {
      translate([-frontw/2,midcovery-mediumwall-frontflange-ytolerance,0]) cube([frontw,mediumwall,fronth]);
      translate([-frontw/2-frontflange,midcovery-mediumwall-ytolerance,0]) cube([frontw+frontflange*2,mediumwall,fronth+frontflange]);
    }
    translate([-frontw/2+xtolerance,midcovery-0.1-frontflange*2,-0.1]) cube([frontw-xtolerance*2,mediumwall+frontflange*2+0.2,fronth+ztolerance+0.1]);
  }
}

if (print==0) {
  intersection() {
    union() {
      ankermakem5();
      #backcover();
      #leftcover();
      #rightcover();
      #topcover();
      #frontcover();
    }
    //    translate([0,-b,-b]) cube([b*2,b*2,b*2]);
  }
 }

if (print==1) {
  //backcover();
  //leftcover();
  //rightcover();
        topcover();
  //frontcover();
 }

if (print==2) {
  translate([0,0,topbarheight+mediumwall+topbarh]) rotate([180,0,0]) backcover();
 }

if (print==5) {
  difference() {
    translate([95,185,mediumwall+xtolerance+0.1-leftboxx]) rotate([0,-90,45]) translate([0,-towerl/2,0]) leftcover();
    #printareacube("anycubic");
  }
 }

if (print==6) {
  difference() {
    translate([-190+3,-85-8,0]) rotate([0,90,45]) translate([-rightboxx-rightboxw-mediumwall-wall-xtolerance,-towerl/2-mediumwall,0]) rightcover();
    #printareacube("anycubic");
  }
 }

if (print==7) {
  difference() {
    translate([-9,10,0]) rotate([0,180,0]) translate([0,0,-(towerh+0.1+towerfreespaceabove+mediumwall)]) topcover();
    #printareacube("anycubic");
  }
 }

if (print==8) {
  rotate([90,0,0]) translate([0,-fronty,0]) frontcover();
 }
